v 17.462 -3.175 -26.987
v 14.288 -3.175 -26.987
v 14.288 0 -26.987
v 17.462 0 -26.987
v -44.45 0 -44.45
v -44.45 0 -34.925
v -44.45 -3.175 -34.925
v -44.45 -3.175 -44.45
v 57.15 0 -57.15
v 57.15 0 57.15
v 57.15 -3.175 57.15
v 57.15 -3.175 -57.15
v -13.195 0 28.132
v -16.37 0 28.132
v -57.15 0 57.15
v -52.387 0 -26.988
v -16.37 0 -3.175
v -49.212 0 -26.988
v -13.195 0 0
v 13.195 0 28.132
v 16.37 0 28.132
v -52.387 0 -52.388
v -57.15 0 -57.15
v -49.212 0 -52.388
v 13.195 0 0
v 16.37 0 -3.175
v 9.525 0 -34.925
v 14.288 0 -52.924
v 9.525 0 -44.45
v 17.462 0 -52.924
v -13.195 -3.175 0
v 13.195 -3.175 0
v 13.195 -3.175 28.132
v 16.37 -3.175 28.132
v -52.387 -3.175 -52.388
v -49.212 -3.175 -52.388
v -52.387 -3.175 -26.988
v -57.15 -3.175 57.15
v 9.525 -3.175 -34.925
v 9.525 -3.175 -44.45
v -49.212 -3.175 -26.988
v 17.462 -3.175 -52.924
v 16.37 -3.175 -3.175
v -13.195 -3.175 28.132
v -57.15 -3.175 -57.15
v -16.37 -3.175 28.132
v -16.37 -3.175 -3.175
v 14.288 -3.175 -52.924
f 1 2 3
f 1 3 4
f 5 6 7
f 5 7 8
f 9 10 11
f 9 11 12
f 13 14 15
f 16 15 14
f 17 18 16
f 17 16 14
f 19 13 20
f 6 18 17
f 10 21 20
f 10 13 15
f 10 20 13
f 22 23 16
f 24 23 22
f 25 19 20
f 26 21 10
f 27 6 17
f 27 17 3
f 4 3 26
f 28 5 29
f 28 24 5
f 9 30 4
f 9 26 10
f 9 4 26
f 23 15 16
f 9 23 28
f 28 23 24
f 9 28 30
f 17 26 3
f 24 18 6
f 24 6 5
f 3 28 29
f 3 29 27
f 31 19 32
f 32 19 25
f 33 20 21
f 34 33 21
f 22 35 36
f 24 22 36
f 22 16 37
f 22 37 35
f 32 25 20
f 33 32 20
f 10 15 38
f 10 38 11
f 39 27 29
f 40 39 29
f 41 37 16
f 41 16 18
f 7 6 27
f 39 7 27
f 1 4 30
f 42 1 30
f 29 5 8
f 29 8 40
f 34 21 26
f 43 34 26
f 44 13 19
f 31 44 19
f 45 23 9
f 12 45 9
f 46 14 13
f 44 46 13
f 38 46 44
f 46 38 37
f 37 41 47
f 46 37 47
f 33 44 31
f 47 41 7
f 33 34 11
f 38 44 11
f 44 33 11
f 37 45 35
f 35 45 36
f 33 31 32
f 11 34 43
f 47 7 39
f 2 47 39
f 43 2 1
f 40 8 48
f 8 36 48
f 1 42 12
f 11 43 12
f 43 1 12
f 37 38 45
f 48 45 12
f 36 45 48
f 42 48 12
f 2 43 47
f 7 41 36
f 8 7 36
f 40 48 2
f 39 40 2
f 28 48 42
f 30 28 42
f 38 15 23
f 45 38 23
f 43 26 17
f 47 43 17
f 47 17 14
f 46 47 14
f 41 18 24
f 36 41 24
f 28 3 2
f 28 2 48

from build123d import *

# Parameters (mm, degrees)
SKETCH1_W           = 114.3
SKETCH1_H           = 114.3
SKETCH1_W_2         = 3.175
SKETCH1_H_2         = 25.4
SKETCH1_W_3         = 53.975
SKETCH1_H_3         = 9.525
SKETCH1_H_4         = 25.936362634
BOSS_EXTRUDE1_DEPTH = 3.175


with BuildPart() as part:
    # Sketch1 → Boss-Extrude1 (new body)
    with BuildSketch(Plane(origin=(0, 0, 0), x_dir=(1, 0, 0), z_dir=(0, 1, 0))):
        Rectangle(SKETCH1_W, SKETCH1_H)
        Polygon((-13.1953, 0), (-13.1953, -28.132309502), (-16.3703, -28.132309502), (-16.3703, 3.175), (-13.1953, 3.175), (13.1953, 3.175), (16.3703, 3.175), (16.3703, -28.132309502), (13.1953, -28.132309502), (13.1953, 0), align=None, mode=Mode.SUBTRACT)
        with Locations((-50.8, 39.6875)):
            Rectangle(SKETCH1_W_2, SKETCH1_H_2, mode=Mode.SUBTRACT)
        with Locations((-17.4625, 39.6875)):
            Rectangle(SKETCH1_W_3, SKETCH1_H_3, mode=Mode.SUBTRACT)
        with Locations((15.875, 39.955681317)):
            Rectangle(SKETCH1_W_2, SKETCH1_H_4, mode=Mode.SUBTRACT)
    extrude(amount=-BOSS_EXTRUDE1_DEPTH)


solid = part.part
